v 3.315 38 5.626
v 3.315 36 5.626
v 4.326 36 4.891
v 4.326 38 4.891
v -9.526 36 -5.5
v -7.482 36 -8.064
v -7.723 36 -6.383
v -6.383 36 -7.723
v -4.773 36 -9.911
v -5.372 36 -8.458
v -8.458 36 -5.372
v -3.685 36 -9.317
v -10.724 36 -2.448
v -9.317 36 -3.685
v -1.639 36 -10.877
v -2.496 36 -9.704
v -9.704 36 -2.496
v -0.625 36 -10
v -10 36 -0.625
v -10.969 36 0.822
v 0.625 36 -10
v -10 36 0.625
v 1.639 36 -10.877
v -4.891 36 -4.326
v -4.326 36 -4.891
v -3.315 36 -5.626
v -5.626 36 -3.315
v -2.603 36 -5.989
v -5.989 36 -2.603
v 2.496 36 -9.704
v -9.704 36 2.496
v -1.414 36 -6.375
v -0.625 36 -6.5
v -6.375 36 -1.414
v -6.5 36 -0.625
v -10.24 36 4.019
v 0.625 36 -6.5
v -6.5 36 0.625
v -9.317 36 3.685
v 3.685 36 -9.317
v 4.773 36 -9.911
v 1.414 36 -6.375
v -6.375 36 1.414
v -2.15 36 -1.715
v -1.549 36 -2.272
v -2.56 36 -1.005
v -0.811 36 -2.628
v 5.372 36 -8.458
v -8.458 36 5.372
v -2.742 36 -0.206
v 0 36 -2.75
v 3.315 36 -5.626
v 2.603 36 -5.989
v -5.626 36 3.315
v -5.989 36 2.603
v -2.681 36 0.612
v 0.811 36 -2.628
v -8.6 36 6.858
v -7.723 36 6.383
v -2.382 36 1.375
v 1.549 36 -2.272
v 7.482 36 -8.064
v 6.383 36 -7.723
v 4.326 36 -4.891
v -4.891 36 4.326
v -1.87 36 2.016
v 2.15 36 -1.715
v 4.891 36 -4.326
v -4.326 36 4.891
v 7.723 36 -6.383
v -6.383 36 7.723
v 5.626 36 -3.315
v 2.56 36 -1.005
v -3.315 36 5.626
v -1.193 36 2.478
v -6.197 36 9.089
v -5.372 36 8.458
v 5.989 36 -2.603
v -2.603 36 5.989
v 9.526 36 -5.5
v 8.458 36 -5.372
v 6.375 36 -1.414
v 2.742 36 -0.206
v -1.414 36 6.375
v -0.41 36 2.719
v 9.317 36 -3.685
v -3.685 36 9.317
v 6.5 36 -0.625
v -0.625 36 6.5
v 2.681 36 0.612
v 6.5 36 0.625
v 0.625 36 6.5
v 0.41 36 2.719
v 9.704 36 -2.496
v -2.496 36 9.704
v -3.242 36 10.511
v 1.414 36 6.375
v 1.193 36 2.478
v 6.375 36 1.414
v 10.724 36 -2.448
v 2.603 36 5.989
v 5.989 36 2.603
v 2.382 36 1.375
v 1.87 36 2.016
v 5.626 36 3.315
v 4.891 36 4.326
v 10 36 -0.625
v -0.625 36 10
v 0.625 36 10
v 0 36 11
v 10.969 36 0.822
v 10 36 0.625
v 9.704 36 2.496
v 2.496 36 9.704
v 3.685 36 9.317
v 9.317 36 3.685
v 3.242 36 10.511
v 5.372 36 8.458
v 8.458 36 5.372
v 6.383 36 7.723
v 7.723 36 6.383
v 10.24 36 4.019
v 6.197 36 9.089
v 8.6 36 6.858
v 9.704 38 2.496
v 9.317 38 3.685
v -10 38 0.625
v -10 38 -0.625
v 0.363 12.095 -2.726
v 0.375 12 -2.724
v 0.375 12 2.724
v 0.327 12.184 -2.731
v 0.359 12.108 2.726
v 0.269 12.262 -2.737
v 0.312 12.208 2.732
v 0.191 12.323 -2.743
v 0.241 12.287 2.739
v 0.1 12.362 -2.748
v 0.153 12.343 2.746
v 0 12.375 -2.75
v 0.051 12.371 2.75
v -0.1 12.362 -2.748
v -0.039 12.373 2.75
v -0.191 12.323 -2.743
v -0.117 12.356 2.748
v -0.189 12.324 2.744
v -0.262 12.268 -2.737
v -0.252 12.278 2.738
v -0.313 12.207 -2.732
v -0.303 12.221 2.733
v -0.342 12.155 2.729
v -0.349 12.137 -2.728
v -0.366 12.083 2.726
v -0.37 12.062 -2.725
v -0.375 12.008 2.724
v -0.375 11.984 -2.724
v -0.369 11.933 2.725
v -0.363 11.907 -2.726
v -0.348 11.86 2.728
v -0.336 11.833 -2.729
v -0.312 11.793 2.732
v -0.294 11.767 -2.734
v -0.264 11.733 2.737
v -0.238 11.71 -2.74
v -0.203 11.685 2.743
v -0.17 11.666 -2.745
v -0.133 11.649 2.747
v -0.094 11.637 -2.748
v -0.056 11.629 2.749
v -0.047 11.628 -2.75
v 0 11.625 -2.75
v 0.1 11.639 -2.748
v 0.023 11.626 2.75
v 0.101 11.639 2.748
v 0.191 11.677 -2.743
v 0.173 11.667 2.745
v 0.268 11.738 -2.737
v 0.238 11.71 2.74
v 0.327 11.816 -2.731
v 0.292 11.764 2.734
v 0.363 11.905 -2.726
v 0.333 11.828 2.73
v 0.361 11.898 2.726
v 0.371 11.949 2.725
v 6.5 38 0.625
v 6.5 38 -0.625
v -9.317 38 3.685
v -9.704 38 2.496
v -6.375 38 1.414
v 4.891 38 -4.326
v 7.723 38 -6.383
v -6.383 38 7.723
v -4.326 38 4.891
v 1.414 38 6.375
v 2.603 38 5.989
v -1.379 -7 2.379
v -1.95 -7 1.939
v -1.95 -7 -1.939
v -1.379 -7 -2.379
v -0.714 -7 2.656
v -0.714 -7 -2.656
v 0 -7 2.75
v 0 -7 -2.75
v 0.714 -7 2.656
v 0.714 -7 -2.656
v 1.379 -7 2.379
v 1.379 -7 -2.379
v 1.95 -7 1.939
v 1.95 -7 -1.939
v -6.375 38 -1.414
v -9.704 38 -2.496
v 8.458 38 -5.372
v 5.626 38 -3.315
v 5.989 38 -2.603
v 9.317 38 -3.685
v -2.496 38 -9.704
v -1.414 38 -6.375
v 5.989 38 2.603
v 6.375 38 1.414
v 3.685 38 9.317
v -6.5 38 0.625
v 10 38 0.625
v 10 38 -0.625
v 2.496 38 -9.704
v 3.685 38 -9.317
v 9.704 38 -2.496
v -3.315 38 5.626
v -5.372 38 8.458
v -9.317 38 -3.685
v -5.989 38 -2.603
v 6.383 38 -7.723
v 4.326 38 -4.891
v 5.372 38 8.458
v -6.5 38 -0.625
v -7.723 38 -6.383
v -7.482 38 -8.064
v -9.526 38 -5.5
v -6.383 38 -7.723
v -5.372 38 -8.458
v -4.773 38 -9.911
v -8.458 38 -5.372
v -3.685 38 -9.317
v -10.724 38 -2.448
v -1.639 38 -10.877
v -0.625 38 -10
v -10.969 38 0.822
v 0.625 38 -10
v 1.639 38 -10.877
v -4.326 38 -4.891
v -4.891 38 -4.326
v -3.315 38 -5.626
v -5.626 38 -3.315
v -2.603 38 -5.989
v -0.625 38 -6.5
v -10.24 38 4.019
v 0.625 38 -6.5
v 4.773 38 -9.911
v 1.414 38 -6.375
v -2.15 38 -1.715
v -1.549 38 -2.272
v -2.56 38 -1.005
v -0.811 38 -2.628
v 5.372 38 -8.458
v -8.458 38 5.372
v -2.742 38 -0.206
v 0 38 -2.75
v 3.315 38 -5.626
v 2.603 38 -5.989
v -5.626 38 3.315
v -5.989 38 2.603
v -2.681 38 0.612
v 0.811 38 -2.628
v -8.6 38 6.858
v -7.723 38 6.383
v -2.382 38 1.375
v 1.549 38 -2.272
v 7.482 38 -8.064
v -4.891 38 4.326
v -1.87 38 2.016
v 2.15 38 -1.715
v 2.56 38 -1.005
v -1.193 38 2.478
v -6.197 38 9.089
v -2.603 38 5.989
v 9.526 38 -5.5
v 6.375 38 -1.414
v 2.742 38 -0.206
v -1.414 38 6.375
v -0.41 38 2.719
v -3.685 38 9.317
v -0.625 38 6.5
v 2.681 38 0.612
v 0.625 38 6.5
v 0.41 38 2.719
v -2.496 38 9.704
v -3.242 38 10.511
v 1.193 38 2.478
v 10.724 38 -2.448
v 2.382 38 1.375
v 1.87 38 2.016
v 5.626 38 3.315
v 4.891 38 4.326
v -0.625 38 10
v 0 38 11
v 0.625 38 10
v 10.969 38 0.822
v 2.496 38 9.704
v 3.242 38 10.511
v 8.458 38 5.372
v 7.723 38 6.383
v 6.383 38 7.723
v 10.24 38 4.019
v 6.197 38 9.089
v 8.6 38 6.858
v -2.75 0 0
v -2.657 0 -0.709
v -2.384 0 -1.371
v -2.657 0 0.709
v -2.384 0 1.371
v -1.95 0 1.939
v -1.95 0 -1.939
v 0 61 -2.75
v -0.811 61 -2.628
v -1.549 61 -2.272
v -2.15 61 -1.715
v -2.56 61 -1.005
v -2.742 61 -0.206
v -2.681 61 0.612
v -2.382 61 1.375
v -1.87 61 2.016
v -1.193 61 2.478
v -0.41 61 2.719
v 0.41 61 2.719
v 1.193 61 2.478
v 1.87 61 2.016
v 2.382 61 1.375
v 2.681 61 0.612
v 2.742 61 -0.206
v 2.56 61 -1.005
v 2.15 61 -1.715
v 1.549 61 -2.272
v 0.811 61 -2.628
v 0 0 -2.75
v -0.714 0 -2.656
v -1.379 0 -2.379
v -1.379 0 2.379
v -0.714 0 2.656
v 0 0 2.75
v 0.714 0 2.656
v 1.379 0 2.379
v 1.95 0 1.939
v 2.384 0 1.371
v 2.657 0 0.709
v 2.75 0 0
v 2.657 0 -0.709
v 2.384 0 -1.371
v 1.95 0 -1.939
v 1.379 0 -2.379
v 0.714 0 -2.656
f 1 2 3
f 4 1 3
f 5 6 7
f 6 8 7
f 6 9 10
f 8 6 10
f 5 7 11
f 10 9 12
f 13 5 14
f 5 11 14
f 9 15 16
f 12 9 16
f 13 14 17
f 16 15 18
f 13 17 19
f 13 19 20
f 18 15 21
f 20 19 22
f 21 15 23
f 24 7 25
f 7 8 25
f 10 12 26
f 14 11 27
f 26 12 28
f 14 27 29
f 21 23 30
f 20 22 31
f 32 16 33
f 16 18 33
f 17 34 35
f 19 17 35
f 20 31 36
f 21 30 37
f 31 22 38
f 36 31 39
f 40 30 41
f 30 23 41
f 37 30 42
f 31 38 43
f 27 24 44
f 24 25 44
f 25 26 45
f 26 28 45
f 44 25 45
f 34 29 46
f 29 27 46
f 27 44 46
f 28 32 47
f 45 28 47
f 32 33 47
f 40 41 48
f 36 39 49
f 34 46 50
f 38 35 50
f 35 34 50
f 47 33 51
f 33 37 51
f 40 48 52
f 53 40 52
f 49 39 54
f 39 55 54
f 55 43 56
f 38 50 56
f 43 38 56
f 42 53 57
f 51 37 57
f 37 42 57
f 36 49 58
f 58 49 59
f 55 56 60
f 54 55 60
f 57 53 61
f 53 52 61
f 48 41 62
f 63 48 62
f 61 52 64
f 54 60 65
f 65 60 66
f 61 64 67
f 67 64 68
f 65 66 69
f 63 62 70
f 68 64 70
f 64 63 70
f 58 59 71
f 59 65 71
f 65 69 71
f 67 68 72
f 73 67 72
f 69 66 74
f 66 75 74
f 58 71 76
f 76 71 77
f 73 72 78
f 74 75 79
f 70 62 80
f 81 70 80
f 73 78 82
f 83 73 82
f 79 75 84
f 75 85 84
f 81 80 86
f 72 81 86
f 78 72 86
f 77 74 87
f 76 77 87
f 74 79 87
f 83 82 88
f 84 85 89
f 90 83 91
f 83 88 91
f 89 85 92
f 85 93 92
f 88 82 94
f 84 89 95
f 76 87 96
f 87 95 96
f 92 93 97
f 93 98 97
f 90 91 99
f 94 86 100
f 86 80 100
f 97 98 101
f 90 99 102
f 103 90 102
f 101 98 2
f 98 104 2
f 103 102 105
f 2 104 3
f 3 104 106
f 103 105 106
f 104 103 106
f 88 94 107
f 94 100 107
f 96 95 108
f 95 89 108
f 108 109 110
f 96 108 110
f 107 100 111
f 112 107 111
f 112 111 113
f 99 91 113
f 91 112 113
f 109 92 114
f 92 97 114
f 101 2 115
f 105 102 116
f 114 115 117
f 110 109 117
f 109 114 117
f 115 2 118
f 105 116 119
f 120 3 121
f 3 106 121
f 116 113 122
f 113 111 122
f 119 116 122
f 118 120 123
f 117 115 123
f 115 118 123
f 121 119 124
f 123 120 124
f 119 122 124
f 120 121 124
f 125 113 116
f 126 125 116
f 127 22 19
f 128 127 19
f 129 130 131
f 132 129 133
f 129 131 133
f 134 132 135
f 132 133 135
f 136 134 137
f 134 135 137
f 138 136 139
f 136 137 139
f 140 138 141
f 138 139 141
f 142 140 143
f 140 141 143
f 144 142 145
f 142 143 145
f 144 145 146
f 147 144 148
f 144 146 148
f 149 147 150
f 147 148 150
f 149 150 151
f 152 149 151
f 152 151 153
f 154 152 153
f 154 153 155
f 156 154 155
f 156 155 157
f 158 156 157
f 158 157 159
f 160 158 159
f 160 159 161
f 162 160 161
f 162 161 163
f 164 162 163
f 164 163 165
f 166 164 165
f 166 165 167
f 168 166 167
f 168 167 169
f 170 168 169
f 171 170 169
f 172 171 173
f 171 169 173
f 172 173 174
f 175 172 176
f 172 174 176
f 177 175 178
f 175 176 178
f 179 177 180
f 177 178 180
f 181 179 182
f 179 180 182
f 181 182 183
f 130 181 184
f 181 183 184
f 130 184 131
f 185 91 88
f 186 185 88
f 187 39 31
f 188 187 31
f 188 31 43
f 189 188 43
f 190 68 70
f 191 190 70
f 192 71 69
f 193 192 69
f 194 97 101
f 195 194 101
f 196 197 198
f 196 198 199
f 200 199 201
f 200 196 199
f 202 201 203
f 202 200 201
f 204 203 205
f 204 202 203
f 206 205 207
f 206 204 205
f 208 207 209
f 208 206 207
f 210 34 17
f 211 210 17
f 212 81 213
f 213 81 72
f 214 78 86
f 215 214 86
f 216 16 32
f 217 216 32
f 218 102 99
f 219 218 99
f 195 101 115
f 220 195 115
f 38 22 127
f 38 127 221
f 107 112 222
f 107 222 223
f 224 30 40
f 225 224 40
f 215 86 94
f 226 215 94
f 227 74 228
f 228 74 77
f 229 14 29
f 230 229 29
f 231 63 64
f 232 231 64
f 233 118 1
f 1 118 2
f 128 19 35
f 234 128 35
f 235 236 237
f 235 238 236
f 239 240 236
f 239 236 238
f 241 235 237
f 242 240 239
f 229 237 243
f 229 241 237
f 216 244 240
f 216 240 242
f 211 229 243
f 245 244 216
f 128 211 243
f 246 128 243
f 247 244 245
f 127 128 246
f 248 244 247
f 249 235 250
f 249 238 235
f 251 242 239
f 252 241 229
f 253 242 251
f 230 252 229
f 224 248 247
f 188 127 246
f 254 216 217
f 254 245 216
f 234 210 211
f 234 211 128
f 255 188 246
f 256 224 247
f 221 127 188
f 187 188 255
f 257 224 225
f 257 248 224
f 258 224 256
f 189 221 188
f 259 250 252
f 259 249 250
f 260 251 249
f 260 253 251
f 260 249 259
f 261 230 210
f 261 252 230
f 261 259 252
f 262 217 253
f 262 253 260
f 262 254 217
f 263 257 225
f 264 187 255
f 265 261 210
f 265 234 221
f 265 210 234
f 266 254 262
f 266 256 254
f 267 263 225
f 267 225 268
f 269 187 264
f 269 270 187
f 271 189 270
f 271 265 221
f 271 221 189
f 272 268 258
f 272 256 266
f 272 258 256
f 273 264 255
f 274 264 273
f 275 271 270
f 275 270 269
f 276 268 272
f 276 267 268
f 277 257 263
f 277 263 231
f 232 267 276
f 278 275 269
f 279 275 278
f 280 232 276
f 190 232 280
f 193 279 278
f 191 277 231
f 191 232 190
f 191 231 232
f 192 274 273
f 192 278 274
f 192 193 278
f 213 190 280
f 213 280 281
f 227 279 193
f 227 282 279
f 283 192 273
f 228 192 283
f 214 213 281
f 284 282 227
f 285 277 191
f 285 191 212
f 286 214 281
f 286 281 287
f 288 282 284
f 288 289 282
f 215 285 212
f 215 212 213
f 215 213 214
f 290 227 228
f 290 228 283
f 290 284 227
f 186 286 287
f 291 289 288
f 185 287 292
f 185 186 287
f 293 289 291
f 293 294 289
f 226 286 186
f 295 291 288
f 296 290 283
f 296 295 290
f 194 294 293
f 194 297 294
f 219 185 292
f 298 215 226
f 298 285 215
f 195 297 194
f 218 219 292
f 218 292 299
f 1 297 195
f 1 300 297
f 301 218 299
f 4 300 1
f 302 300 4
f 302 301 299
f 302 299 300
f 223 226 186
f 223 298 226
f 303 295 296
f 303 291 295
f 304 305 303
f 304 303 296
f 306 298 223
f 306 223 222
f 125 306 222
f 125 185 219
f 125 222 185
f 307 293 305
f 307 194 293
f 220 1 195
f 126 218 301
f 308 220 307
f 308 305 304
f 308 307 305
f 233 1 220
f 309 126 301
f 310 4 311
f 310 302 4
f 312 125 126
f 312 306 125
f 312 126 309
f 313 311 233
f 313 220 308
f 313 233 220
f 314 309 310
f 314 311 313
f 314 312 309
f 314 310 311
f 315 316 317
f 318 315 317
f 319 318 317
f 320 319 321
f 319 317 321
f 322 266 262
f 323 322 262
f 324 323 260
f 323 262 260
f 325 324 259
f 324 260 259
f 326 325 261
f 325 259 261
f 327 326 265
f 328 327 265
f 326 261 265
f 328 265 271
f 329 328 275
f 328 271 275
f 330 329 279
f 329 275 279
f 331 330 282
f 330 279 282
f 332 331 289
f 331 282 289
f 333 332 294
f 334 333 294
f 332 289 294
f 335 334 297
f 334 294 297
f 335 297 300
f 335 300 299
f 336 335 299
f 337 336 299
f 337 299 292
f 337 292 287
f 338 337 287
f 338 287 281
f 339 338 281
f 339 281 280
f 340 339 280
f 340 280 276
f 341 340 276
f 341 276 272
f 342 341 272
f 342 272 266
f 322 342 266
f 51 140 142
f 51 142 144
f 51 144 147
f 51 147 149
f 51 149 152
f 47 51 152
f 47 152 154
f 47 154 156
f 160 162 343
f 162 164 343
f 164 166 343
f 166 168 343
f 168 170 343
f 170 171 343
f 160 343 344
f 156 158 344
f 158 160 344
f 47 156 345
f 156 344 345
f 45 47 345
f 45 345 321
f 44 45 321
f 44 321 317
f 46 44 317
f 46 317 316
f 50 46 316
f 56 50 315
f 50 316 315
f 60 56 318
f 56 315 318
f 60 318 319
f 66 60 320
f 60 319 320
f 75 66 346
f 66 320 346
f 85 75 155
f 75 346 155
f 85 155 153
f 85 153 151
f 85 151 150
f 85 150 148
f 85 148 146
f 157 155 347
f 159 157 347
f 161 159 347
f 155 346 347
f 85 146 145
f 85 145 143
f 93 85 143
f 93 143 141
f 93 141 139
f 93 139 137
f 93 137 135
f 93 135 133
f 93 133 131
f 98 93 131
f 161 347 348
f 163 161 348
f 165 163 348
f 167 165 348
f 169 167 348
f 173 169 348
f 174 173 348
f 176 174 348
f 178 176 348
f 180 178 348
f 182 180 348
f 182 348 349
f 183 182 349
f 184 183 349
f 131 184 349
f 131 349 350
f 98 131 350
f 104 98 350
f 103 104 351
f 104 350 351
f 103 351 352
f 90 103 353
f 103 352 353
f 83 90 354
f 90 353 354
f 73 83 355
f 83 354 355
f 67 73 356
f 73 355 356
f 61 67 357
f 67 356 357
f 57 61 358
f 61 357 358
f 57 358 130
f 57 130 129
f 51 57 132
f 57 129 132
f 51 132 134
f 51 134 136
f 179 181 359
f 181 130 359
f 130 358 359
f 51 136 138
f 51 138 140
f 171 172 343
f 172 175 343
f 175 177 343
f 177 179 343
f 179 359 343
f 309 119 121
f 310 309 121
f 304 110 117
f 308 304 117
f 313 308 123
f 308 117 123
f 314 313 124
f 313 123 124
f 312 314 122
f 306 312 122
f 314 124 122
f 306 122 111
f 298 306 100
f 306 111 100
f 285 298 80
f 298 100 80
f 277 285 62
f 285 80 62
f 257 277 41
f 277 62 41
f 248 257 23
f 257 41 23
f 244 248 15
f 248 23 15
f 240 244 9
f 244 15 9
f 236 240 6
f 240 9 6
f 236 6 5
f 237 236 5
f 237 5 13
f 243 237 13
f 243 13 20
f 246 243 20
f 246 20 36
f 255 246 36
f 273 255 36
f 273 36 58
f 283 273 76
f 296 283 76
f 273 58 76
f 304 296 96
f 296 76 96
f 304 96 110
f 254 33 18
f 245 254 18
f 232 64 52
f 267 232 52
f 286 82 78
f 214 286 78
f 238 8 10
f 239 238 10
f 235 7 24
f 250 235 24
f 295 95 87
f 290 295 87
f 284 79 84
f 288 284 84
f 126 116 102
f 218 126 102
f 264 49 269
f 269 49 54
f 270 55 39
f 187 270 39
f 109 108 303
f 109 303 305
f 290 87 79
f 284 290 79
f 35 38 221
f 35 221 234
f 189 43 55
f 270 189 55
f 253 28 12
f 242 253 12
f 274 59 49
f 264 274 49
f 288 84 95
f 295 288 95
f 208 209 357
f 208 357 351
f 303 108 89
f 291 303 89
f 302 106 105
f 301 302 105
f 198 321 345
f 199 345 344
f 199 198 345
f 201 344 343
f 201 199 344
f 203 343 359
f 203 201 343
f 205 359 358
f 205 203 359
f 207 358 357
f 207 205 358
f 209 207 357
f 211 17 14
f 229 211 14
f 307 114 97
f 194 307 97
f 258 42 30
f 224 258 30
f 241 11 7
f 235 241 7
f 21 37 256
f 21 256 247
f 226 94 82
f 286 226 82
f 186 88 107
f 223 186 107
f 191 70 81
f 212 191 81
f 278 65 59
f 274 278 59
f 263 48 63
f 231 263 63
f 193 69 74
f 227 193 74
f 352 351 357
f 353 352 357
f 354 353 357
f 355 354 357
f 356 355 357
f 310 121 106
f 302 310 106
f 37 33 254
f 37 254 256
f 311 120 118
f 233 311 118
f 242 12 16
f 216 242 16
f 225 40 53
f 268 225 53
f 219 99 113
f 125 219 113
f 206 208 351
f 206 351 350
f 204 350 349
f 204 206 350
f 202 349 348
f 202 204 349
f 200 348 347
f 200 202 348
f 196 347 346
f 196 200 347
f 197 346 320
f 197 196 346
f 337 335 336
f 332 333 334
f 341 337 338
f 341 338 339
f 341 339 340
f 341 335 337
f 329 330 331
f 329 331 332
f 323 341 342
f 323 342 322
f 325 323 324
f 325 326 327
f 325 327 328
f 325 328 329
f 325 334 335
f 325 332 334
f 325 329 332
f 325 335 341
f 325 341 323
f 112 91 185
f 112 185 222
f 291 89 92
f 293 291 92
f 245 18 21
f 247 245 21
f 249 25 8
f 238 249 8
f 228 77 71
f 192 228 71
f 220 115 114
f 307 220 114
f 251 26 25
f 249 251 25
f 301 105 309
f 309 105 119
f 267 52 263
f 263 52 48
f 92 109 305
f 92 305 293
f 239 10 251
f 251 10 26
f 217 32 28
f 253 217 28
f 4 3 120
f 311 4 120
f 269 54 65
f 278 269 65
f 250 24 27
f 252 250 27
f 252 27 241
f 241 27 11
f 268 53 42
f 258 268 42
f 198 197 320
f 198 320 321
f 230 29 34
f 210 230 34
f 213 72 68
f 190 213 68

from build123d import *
from build123d.topology import SkipClean

# Parameters (mm, degrees)
SKETCH_1_R          = 2.75
EXTRUDE_1_DEPTH     = 61
EXTRUDE_START       = 7
EXTRUDE_2_DEPTH     = 7
SKETCH_4_R          = 0.375
CUT_EXTRUDE_1_DEPTH = 5
EXTRUDE_START_2     = -25
SKETCH_6_R          = 11
SKETCH_6_W          = 1.25
SKETCH_6_H          = 3.5
SKETCH_6_W_2        = 3.5
SKETCH_6_H_2        = 1.25
EXTRUDE_4_DEPTH     = 2


with BuildPart() as part:
    # 草图1 → 凸台-拉伸1 (new body)
    with BuildSketch(Plane(origin=(0, 0, 0), x_dir=(1, 0, 0), z_dir=(0, 1, 0))):
        Circle(SKETCH_1_R)
    extrude(amount=EXTRUDE_1_DEPTH)

    # 草图2 → 凸台-拉伸2 (add)
    with SkipClean():  # the faces are left unmerged after this step: merging them gives an invalid solid
        with BuildSketch(Plane.XZ.offset(EXTRUDE_START)):
            with BuildLine():
                Line((-1.95, 1.939071943), (-1.95, -1.939071943))
                ThreePointArc((-1.95, -1.939071943), (0, -2.75), (1.95, -1.939071943))
                Line((1.95, -1.939071943), (1.95, 1.939071943))
                ThreePointArc((1.95, 1.939071943), (0, 2.75), (-1.95, 1.939071943))
            make_face()
        extrude(amount=-EXTRUDE_2_DEPTH)

    # 草图4 → 切除-拉伸1 (cut, symmetric)
    with SkipClean():  # the faces are left unmerged after this step: merging them gives an invalid solid
        with BuildSketch(Plane.XY):
            with Locations((0, 12)):
                Circle(SKETCH_4_R)
        extrude(amount=CUT_EXTRUDE_1_DEPTH, both=True, mode=Mode.SUBTRACT)

    # 草图6 → 凸台-拉伸4 (add)
    with SkipClean():  # the faces are left unmerged after this step: merging them gives an invalid solid
        with BuildSketch(Plane(origin=(0, 61, 0), x_dir=(1, 0, 0), z_dir=(0, 1, 0)).offset(EXTRUDE_START_2)):
            Circle(SKETCH_6_R)
            Polygon((2.495759621, 9.703700784), (3.684580266, 9.317429541), (2.603020786, 5.988731734), (1.414200141, 6.375002977), align=None, mode=Mode.SUBTRACT)
            with Locations((0, 8.25)):
                Rectangle(SKETCH_6_W, SKETCH_6_H, mode=Mode.SUBTRACT)
            Polygon((5.372216901, 8.457535726), (6.383488144, 7.722804161), (4.326239761, 4.891244681), (3.314968518, 5.625976246), align=None, mode=Mode.SUBTRACT)
            Polygon((7.722804161, 6.383488144), (8.457535726, 5.372216901), (5.625976246, 3.314968518), (4.891244681, 4.326239761), align=None, mode=Mode.SUBTRACT)
            Polygon((9.317429541, 3.684580266), (9.703700784, 2.495759621), (6.375002977, 1.414200141), (5.988731734, 2.603020786), align=None, mode=Mode.SUBTRACT)
            with Locations((8.25, 0)):
                Rectangle(SKETCH_6_W_2, SKETCH_6_H_2, mode=Mode.SUBTRACT)
            Polygon((9.703700784, -2.495759621), (9.317429541, -3.684580266), (5.988731734, -2.603020786), (6.375002977, -1.414200141), align=None, mode=Mode.SUBTRACT)
            Polygon((8.457535726, -5.372216901), (7.722804161, -6.383488144), (4.891244681, -4.326239761), (5.625976246, -3.314968518), align=None, mode=Mode.SUBTRACT)
            Polygon((6.383488144, -7.722804161), (5.372216901, -8.457535726), (3.314968518, -5.625976246), (4.326239761, -4.891244681), align=None, mode=Mode.SUBTRACT)
            Polygon((3.684580266, -9.317429541), (2.495759621, -9.703700784), (1.414200141, -6.375002977), (2.603020786, -5.988731734), align=None, mode=Mode.SUBTRACT)
            with Locations((0, -8.25)):
                Rectangle(SKETCH_6_W, SKETCH_6_H, mode=Mode.SUBTRACT)
            Polygon((-2.495759621, -9.703700784), (-3.684580266, -9.317429541), (-2.603020786, -5.988731734), (-1.414200141, -6.375002977), align=None, mode=Mode.SUBTRACT)
            Polygon((-5.372216901, -8.457535726), (-6.383488144, -7.722804161), (-4.326239761, -4.891244681), (-3.314968518, -5.625976246), align=None, mode=Mode.SUBTRACT)
            Polygon((-7.722804161, -6.383488144), (-8.457535726, -5.372216901), (-5.625976246, -3.314968518), (-4.891244681, -4.326239761), align=None, mode=Mode.SUBTRACT)
            Polygon((-9.317429541, -3.684580266), (-9.703700784, -2.495759621), (-6.375002977, -1.414200141), (-5.988731734, -2.603020786), align=None, mode=Mode.SUBTRACT)
            with Locations((-8.25, 0)):
                Rectangle(SKETCH_6_W_2, SKETCH_6_H_2, mode=Mode.SUBTRACT)
            Polygon((-9.703700784, 2.495759621), (-9.317429541, 3.684580266), (-5.988731734, 2.603020786), (-6.375002977, 1.414200141), align=None, mode=Mode.SUBTRACT)
            Polygon((-8.457535726, 5.372216901), (-7.722804161, 6.383488144), (-4.891244681, 4.326239761), (-5.625976246, 3.314968518), align=None, mode=Mode.SUBTRACT)
            Polygon((-6.383488144, 7.722804161), (-5.372216901, 8.457535726), (-3.314968518, 5.625976246), (-4.326239761, 4.891244681), align=None, mode=Mode.SUBTRACT)
            Polygon((-3.684580266, 9.317429541), (-2.495759621, 9.703700784), (-1.414200141, 6.375002977), (-2.603020786, 5.988731734), align=None, mode=Mode.SUBTRACT)
        extrude(amount=EXTRUDE_4_DEPTH)


solid = part.part
